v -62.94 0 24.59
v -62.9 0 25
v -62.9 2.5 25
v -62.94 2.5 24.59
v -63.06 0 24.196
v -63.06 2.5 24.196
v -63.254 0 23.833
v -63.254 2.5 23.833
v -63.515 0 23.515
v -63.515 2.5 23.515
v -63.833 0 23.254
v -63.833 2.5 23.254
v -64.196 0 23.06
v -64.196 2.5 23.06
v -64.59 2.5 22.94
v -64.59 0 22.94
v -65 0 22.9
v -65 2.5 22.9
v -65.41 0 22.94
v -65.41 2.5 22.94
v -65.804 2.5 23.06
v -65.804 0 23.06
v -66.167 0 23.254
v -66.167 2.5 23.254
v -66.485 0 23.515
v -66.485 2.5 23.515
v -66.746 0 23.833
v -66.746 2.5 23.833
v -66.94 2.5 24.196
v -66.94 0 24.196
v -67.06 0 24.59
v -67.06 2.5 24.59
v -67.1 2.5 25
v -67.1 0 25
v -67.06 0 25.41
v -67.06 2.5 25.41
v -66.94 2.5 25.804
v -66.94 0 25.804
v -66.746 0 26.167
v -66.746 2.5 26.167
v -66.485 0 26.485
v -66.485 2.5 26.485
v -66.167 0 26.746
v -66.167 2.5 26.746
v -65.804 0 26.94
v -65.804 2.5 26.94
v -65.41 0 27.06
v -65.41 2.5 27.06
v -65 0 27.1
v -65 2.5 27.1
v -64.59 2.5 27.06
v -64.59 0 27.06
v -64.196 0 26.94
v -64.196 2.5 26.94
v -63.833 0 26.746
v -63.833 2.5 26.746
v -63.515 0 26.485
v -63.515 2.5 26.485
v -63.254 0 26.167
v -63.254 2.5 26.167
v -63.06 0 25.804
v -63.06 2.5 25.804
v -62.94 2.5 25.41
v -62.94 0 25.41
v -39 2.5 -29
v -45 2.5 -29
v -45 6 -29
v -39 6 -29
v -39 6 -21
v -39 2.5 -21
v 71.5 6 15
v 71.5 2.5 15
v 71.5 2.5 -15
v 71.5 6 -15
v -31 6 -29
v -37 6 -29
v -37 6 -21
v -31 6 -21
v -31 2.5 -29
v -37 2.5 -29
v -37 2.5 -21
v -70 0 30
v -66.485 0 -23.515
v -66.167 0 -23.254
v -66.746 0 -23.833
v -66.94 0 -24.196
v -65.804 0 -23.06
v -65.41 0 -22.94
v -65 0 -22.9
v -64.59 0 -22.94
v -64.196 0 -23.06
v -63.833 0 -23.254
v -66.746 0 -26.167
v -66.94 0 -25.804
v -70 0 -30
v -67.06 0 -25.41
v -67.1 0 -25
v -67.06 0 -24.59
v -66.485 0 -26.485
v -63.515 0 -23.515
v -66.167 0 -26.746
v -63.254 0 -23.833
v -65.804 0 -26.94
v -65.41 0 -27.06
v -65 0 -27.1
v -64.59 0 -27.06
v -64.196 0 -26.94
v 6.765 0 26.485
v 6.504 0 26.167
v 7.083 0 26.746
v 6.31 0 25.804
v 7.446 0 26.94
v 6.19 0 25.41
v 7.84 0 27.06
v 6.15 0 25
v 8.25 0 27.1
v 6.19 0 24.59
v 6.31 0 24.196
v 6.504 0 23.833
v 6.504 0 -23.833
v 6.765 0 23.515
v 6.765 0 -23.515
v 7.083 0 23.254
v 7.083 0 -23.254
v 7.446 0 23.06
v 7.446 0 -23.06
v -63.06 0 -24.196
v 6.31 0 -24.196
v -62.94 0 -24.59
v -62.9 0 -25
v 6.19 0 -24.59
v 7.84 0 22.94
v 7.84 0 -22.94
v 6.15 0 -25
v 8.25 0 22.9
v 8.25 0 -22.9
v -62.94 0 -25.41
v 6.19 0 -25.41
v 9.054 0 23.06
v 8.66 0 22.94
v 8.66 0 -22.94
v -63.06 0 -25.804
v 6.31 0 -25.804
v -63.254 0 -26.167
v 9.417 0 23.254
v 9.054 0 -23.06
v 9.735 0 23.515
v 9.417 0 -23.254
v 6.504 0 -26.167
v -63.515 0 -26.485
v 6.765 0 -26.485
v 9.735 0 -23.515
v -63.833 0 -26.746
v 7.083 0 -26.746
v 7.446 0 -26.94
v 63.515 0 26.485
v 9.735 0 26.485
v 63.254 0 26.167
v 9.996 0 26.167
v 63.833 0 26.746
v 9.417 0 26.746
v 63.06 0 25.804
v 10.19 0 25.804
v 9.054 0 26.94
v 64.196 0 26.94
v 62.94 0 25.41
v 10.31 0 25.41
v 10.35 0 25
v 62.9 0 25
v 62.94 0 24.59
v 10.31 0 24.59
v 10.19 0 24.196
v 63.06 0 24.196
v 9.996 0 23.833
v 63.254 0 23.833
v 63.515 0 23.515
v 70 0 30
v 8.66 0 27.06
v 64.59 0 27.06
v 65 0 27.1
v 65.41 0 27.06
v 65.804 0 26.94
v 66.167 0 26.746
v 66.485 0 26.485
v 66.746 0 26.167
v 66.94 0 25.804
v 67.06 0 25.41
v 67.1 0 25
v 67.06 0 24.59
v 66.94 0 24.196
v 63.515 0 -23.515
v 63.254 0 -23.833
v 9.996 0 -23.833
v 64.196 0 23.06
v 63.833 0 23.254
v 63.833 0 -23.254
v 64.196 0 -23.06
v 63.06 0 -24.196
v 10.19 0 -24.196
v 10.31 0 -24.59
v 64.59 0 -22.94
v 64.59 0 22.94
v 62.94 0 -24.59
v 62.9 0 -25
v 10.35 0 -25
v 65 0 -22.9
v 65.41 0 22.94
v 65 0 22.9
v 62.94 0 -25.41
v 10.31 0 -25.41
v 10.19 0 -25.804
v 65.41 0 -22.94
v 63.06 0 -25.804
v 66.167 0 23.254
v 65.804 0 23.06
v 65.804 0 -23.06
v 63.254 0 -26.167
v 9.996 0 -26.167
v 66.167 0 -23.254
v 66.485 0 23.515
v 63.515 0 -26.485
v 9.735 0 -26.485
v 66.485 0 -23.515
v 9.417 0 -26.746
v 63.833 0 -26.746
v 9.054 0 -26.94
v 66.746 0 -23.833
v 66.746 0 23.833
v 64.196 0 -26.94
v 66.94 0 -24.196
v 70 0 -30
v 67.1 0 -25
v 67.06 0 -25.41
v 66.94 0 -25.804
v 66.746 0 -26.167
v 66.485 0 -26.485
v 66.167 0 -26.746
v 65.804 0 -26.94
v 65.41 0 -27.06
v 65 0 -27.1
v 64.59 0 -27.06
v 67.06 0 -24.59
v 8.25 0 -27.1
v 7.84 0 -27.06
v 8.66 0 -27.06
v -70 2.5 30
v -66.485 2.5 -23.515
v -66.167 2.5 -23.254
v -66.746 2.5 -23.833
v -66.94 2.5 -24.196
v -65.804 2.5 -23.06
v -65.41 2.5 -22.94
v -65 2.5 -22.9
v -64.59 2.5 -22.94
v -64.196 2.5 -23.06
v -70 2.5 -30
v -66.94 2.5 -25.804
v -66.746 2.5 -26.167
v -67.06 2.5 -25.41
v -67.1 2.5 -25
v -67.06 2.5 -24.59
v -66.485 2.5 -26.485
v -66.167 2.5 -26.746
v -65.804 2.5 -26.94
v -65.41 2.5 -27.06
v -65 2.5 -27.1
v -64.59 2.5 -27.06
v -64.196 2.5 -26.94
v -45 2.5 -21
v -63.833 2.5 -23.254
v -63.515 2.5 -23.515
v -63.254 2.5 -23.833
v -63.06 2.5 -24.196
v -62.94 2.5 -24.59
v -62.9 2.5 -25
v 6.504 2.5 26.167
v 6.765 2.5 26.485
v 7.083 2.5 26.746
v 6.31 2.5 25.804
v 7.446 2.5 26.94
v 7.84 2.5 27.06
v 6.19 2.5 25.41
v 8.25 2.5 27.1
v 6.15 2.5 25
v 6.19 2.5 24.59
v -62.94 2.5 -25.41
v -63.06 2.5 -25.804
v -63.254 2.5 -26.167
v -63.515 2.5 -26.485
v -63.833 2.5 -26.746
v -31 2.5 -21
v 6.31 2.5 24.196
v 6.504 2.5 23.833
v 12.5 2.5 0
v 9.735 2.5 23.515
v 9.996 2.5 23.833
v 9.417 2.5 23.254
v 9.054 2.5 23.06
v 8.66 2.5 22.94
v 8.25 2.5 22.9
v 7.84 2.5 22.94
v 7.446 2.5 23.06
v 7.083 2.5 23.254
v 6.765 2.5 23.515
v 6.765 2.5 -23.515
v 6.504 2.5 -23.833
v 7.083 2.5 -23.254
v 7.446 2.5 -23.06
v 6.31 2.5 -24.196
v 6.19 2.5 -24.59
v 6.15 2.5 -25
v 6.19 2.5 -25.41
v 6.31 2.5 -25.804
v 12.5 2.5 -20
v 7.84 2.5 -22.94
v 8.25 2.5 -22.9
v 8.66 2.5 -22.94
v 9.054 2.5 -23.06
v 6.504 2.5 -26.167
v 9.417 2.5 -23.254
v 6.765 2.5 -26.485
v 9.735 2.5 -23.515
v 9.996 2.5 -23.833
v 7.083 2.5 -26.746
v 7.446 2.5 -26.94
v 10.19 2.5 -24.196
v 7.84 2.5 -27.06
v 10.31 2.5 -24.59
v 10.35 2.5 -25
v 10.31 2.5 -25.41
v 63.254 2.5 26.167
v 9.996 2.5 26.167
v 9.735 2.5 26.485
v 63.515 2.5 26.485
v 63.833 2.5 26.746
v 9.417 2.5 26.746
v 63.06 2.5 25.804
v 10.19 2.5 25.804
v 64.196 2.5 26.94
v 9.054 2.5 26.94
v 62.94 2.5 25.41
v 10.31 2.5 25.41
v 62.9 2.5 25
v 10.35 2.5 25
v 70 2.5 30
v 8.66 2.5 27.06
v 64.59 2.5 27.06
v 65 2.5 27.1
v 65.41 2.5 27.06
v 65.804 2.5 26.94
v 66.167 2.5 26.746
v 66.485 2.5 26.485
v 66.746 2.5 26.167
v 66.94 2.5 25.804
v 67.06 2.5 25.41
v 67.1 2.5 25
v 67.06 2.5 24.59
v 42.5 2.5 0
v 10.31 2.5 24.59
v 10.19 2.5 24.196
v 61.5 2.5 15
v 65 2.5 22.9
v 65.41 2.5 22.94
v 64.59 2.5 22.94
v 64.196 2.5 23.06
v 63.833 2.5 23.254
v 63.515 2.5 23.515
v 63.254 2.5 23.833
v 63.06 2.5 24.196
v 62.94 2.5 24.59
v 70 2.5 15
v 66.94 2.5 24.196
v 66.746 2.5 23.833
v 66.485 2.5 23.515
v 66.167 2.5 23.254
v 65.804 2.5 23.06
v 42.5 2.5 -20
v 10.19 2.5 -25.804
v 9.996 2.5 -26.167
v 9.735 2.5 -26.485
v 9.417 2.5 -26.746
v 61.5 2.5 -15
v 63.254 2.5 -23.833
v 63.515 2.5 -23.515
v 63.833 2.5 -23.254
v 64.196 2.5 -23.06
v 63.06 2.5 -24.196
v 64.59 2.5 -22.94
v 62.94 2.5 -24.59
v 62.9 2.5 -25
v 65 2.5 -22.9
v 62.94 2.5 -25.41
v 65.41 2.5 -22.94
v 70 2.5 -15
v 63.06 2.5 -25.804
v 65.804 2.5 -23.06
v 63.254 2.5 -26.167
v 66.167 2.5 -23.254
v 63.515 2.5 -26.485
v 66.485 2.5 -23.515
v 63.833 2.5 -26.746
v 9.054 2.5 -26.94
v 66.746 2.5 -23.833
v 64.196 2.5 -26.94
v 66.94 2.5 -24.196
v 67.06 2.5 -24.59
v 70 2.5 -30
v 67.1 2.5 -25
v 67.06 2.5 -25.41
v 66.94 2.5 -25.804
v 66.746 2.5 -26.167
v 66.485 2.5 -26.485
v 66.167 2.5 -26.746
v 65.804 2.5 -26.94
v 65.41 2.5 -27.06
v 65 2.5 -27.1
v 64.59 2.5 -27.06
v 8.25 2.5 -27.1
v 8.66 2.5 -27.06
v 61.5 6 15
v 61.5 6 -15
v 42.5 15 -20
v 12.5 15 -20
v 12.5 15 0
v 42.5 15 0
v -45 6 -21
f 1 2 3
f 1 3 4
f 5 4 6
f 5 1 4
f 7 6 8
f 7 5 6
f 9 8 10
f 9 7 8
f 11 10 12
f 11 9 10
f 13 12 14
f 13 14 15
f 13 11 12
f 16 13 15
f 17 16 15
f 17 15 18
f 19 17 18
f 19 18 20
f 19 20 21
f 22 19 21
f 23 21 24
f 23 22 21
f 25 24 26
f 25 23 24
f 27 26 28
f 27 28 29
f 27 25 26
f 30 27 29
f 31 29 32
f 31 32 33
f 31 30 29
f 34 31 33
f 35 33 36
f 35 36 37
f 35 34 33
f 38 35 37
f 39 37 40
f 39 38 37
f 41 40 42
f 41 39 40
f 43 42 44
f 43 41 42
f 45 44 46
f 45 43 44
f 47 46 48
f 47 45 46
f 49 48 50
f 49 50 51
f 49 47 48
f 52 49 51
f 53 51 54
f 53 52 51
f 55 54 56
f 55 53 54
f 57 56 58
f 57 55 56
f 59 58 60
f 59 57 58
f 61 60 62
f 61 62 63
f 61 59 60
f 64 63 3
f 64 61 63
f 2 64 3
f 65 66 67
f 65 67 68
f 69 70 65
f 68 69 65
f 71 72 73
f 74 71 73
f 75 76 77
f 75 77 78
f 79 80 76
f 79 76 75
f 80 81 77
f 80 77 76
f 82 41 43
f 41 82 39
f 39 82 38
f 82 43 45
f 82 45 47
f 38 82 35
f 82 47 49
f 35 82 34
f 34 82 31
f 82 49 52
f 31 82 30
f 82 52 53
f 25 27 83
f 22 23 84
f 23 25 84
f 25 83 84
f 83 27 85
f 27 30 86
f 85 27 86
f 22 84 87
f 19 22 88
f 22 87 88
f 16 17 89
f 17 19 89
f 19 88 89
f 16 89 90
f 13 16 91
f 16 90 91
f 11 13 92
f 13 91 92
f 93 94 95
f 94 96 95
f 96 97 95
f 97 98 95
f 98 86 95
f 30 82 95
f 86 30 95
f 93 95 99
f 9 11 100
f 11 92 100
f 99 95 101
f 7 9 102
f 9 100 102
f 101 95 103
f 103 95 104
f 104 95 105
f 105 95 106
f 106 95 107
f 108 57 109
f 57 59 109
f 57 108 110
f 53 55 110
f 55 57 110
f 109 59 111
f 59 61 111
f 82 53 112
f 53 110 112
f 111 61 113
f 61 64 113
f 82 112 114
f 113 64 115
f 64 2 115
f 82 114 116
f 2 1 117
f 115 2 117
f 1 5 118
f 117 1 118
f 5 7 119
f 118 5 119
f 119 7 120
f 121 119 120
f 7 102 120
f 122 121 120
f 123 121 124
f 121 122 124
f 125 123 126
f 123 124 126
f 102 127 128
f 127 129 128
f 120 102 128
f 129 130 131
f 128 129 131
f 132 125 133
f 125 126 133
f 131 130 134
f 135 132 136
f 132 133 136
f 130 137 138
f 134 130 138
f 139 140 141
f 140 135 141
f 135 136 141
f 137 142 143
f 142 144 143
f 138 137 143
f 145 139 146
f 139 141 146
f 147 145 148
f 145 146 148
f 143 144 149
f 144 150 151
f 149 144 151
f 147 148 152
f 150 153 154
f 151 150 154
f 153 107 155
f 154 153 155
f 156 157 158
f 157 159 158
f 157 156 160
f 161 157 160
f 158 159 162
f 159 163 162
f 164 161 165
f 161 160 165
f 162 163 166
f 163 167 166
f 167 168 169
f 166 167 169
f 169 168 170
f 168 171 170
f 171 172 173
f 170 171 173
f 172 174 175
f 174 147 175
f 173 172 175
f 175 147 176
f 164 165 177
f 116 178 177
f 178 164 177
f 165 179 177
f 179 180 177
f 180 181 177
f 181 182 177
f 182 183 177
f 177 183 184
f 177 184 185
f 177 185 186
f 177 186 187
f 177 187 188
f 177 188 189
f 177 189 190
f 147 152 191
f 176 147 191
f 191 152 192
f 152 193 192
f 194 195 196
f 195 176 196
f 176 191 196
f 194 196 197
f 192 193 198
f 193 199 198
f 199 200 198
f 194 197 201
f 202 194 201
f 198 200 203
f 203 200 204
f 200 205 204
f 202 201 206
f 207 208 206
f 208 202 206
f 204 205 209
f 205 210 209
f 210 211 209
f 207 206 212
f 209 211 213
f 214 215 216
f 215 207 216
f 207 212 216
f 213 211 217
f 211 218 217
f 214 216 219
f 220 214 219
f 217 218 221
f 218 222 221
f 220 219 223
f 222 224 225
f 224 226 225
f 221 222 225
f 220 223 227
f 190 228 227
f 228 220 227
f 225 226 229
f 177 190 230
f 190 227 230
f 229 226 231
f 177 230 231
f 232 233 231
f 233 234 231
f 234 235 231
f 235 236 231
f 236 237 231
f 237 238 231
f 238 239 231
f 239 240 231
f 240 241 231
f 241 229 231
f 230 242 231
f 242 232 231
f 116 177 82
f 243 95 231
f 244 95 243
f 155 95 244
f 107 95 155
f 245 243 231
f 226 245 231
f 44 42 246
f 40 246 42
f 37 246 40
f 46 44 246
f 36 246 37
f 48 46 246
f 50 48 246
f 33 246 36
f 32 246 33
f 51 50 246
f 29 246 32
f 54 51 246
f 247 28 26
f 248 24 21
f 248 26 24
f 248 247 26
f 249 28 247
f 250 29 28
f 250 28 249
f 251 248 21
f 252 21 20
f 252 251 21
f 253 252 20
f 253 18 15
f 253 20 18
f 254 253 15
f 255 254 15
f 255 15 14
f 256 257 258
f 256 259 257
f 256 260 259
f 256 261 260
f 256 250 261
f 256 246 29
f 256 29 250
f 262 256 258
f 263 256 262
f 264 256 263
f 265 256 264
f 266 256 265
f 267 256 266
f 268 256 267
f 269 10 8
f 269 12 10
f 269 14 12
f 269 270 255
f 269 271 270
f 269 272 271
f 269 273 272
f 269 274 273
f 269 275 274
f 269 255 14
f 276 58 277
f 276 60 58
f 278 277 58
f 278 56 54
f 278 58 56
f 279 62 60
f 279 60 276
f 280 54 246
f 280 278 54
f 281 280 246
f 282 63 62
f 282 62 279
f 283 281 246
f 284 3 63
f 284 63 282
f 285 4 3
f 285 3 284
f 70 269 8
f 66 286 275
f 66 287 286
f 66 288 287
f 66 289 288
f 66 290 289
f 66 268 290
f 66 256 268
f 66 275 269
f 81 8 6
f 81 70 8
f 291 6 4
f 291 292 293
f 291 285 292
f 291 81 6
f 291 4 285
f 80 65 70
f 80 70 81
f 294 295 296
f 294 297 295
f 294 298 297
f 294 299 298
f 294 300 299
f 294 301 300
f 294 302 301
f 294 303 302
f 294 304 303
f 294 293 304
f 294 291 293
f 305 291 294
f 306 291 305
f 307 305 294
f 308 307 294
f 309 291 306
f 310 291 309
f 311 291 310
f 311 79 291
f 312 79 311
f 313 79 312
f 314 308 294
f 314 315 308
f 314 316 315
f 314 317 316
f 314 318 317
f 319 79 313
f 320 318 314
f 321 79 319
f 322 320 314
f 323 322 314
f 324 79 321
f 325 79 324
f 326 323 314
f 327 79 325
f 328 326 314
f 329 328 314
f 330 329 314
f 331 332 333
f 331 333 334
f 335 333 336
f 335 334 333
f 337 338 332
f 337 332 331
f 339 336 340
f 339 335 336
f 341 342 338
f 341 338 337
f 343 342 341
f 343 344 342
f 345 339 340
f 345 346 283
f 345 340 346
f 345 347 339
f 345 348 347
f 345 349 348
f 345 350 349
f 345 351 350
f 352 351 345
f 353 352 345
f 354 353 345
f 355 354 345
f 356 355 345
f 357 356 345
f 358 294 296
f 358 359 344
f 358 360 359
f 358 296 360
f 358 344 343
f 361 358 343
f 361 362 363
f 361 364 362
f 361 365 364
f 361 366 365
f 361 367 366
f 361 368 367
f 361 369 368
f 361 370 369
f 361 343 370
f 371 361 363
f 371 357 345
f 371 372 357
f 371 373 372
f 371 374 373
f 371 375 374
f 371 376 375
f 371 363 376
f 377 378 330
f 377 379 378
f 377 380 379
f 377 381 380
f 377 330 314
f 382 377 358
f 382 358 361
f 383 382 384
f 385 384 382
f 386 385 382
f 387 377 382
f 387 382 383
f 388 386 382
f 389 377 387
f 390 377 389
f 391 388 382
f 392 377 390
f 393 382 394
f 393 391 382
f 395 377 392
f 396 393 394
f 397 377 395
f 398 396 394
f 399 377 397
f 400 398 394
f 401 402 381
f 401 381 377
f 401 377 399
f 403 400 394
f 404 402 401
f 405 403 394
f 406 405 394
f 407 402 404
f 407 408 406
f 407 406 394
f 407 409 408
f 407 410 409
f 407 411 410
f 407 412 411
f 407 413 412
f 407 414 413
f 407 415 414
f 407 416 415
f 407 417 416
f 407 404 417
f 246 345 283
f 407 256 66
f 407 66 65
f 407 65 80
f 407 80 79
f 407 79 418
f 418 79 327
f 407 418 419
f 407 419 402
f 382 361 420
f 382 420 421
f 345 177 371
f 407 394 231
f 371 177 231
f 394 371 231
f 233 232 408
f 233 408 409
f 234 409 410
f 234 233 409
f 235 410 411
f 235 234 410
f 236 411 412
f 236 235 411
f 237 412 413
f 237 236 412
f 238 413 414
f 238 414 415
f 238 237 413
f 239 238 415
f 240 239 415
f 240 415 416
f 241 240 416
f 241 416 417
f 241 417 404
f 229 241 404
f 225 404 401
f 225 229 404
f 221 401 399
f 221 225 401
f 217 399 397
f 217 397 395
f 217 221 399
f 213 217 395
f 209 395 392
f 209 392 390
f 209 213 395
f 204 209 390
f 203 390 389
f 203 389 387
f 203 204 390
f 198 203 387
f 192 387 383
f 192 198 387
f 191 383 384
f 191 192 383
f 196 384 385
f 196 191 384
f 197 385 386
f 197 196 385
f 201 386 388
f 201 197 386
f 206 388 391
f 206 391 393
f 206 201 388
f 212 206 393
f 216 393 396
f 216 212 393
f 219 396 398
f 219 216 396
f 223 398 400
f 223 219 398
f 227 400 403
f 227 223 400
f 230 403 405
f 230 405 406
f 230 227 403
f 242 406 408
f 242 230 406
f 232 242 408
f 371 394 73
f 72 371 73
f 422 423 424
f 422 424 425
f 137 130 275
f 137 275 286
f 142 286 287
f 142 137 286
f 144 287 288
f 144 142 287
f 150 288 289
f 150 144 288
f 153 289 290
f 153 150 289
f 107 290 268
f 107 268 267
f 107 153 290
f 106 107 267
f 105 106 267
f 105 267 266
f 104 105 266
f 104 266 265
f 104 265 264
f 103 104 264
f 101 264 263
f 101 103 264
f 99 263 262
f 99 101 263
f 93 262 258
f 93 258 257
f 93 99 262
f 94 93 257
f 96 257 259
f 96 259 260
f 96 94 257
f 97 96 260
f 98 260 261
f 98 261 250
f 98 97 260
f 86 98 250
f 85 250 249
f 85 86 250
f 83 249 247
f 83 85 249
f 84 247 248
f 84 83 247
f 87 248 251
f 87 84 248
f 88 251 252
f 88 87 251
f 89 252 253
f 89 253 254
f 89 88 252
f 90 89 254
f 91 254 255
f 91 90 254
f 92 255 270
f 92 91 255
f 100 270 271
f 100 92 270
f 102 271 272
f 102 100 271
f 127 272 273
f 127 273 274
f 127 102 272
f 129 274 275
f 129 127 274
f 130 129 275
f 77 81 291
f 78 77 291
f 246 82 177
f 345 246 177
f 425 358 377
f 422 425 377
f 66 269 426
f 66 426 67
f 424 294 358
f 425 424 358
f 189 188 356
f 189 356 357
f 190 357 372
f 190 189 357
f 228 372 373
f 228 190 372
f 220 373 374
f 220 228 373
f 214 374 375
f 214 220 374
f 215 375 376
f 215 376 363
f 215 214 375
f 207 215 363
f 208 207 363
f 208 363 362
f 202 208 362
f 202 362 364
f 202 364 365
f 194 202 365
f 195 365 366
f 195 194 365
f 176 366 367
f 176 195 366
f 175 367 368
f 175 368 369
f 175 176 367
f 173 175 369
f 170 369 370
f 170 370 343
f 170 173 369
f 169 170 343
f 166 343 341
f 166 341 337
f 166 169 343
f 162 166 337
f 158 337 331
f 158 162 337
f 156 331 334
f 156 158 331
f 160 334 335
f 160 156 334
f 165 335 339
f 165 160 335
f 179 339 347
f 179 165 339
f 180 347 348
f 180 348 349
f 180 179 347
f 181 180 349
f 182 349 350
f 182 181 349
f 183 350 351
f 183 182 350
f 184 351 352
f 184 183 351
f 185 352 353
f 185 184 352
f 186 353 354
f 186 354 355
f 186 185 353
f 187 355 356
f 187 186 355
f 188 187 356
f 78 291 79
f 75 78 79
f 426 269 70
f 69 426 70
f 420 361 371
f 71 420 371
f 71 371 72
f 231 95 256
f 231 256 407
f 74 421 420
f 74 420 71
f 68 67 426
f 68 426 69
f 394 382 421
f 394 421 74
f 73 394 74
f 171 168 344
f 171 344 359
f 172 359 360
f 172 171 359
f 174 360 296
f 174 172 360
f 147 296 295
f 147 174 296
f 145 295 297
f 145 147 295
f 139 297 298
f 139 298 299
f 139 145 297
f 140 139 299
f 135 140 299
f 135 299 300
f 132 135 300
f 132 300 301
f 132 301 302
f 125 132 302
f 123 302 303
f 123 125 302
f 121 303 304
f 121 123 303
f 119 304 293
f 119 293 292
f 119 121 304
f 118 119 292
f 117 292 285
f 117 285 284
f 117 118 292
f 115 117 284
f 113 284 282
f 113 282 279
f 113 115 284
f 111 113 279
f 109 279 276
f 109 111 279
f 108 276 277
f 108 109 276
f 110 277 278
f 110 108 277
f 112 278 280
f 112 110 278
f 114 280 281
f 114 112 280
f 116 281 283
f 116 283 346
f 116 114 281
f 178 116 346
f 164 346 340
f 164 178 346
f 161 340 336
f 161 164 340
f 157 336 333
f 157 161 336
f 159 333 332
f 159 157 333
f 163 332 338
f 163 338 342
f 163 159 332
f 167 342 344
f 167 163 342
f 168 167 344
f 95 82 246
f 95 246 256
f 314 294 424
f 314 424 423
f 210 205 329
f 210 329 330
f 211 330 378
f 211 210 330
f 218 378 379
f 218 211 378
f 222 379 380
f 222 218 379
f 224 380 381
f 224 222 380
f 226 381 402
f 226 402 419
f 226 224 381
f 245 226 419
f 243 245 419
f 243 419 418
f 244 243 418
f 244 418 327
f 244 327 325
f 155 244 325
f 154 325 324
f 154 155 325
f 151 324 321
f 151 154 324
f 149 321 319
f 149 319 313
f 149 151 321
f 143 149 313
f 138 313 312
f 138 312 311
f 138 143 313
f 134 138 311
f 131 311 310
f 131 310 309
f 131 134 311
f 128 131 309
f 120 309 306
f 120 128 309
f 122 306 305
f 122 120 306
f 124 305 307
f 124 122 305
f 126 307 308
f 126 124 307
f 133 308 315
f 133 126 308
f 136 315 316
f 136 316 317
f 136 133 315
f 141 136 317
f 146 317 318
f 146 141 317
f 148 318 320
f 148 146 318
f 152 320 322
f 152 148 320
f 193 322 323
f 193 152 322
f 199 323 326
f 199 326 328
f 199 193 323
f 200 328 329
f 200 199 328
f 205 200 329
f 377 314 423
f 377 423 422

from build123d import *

# Parameters (mm, degrees)
SKETCH2_W           = 140
SKETCH2_H           = 60
SKETCH2_R           = 2.1
BOSS_EXTRUDE1_DEPTH = 2.5
SKETCH3_W           = 6
SKETCH3_H           = 8
SKETCH3_W_2         = 10
SKETCH3_H_2         = 30
BOSS_EXTRUDE2_DEPTH = 3.5
SKETCH4_W           = 30
SKETCH4_H           = 20
BOSS_EXTRUDE3_DEPTH = 12.5


with BuildPart() as part:
    # Sketch2 → Boss-Extrude1 (new body)
    with BuildSketch(Plane(origin=(0, 0, 0), x_dir=(1, 0, 0), z_dir=(0, 1, 0))):
        Rectangle(SKETCH2_W, SKETCH2_H)
        with Locations((-65, 25)):
            Circle(SKETCH2_R, mode=Mode.SUBTRACT)
        with Locations((8.25, 25)):
            Circle(SKETCH2_R, mode=Mode.SUBTRACT)
        with Locations((65, 25)):
            Circle(SKETCH2_R, mode=Mode.SUBTRACT)
        with Locations((-65, -25)):
            Circle(SKETCH2_R, mode=Mode.SUBTRACT)
        with Locations((8.25, -25)):
            Circle(SKETCH2_R, mode=Mode.SUBTRACT)
        with Locations((65, -25)):
            Circle(SKETCH2_R, mode=Mode.SUBTRACT)
    extrude(amount=BOSS_EXTRUDE1_DEPTH)

    # Sketch3 → Boss-Extrude2 (add)
    with BuildSketch(Plane(origin=(0, 2.5, 0), x_dir=(1, 0, 0), z_dir=(0, 1, 0))):
        with Locations((-42, 25)):
            Rectangle(SKETCH3_W, SKETCH3_H)
        with Locations((-34, 25)):
            Rectangle(SKETCH3_W, SKETCH3_H)
        with Locations((66.5, 0)):
            Rectangle(SKETCH3_W_2, SKETCH3_H_2)
    extrude(amount=BOSS_EXTRUDE2_DEPTH)

    # Sketch4 → Boss-Extrude3 (add)
    with BuildSketch(Plane(origin=(0, 2.5, 0), x_dir=(1, 0, 0), z_dir=(0, 1, 0))):
        with Locations((27.5, 10)):
            Rectangle(SKETCH4_W, SKETCH4_H)
    extrude(amount=BOSS_EXTRUDE3_DEPTH)


solid = part.part
